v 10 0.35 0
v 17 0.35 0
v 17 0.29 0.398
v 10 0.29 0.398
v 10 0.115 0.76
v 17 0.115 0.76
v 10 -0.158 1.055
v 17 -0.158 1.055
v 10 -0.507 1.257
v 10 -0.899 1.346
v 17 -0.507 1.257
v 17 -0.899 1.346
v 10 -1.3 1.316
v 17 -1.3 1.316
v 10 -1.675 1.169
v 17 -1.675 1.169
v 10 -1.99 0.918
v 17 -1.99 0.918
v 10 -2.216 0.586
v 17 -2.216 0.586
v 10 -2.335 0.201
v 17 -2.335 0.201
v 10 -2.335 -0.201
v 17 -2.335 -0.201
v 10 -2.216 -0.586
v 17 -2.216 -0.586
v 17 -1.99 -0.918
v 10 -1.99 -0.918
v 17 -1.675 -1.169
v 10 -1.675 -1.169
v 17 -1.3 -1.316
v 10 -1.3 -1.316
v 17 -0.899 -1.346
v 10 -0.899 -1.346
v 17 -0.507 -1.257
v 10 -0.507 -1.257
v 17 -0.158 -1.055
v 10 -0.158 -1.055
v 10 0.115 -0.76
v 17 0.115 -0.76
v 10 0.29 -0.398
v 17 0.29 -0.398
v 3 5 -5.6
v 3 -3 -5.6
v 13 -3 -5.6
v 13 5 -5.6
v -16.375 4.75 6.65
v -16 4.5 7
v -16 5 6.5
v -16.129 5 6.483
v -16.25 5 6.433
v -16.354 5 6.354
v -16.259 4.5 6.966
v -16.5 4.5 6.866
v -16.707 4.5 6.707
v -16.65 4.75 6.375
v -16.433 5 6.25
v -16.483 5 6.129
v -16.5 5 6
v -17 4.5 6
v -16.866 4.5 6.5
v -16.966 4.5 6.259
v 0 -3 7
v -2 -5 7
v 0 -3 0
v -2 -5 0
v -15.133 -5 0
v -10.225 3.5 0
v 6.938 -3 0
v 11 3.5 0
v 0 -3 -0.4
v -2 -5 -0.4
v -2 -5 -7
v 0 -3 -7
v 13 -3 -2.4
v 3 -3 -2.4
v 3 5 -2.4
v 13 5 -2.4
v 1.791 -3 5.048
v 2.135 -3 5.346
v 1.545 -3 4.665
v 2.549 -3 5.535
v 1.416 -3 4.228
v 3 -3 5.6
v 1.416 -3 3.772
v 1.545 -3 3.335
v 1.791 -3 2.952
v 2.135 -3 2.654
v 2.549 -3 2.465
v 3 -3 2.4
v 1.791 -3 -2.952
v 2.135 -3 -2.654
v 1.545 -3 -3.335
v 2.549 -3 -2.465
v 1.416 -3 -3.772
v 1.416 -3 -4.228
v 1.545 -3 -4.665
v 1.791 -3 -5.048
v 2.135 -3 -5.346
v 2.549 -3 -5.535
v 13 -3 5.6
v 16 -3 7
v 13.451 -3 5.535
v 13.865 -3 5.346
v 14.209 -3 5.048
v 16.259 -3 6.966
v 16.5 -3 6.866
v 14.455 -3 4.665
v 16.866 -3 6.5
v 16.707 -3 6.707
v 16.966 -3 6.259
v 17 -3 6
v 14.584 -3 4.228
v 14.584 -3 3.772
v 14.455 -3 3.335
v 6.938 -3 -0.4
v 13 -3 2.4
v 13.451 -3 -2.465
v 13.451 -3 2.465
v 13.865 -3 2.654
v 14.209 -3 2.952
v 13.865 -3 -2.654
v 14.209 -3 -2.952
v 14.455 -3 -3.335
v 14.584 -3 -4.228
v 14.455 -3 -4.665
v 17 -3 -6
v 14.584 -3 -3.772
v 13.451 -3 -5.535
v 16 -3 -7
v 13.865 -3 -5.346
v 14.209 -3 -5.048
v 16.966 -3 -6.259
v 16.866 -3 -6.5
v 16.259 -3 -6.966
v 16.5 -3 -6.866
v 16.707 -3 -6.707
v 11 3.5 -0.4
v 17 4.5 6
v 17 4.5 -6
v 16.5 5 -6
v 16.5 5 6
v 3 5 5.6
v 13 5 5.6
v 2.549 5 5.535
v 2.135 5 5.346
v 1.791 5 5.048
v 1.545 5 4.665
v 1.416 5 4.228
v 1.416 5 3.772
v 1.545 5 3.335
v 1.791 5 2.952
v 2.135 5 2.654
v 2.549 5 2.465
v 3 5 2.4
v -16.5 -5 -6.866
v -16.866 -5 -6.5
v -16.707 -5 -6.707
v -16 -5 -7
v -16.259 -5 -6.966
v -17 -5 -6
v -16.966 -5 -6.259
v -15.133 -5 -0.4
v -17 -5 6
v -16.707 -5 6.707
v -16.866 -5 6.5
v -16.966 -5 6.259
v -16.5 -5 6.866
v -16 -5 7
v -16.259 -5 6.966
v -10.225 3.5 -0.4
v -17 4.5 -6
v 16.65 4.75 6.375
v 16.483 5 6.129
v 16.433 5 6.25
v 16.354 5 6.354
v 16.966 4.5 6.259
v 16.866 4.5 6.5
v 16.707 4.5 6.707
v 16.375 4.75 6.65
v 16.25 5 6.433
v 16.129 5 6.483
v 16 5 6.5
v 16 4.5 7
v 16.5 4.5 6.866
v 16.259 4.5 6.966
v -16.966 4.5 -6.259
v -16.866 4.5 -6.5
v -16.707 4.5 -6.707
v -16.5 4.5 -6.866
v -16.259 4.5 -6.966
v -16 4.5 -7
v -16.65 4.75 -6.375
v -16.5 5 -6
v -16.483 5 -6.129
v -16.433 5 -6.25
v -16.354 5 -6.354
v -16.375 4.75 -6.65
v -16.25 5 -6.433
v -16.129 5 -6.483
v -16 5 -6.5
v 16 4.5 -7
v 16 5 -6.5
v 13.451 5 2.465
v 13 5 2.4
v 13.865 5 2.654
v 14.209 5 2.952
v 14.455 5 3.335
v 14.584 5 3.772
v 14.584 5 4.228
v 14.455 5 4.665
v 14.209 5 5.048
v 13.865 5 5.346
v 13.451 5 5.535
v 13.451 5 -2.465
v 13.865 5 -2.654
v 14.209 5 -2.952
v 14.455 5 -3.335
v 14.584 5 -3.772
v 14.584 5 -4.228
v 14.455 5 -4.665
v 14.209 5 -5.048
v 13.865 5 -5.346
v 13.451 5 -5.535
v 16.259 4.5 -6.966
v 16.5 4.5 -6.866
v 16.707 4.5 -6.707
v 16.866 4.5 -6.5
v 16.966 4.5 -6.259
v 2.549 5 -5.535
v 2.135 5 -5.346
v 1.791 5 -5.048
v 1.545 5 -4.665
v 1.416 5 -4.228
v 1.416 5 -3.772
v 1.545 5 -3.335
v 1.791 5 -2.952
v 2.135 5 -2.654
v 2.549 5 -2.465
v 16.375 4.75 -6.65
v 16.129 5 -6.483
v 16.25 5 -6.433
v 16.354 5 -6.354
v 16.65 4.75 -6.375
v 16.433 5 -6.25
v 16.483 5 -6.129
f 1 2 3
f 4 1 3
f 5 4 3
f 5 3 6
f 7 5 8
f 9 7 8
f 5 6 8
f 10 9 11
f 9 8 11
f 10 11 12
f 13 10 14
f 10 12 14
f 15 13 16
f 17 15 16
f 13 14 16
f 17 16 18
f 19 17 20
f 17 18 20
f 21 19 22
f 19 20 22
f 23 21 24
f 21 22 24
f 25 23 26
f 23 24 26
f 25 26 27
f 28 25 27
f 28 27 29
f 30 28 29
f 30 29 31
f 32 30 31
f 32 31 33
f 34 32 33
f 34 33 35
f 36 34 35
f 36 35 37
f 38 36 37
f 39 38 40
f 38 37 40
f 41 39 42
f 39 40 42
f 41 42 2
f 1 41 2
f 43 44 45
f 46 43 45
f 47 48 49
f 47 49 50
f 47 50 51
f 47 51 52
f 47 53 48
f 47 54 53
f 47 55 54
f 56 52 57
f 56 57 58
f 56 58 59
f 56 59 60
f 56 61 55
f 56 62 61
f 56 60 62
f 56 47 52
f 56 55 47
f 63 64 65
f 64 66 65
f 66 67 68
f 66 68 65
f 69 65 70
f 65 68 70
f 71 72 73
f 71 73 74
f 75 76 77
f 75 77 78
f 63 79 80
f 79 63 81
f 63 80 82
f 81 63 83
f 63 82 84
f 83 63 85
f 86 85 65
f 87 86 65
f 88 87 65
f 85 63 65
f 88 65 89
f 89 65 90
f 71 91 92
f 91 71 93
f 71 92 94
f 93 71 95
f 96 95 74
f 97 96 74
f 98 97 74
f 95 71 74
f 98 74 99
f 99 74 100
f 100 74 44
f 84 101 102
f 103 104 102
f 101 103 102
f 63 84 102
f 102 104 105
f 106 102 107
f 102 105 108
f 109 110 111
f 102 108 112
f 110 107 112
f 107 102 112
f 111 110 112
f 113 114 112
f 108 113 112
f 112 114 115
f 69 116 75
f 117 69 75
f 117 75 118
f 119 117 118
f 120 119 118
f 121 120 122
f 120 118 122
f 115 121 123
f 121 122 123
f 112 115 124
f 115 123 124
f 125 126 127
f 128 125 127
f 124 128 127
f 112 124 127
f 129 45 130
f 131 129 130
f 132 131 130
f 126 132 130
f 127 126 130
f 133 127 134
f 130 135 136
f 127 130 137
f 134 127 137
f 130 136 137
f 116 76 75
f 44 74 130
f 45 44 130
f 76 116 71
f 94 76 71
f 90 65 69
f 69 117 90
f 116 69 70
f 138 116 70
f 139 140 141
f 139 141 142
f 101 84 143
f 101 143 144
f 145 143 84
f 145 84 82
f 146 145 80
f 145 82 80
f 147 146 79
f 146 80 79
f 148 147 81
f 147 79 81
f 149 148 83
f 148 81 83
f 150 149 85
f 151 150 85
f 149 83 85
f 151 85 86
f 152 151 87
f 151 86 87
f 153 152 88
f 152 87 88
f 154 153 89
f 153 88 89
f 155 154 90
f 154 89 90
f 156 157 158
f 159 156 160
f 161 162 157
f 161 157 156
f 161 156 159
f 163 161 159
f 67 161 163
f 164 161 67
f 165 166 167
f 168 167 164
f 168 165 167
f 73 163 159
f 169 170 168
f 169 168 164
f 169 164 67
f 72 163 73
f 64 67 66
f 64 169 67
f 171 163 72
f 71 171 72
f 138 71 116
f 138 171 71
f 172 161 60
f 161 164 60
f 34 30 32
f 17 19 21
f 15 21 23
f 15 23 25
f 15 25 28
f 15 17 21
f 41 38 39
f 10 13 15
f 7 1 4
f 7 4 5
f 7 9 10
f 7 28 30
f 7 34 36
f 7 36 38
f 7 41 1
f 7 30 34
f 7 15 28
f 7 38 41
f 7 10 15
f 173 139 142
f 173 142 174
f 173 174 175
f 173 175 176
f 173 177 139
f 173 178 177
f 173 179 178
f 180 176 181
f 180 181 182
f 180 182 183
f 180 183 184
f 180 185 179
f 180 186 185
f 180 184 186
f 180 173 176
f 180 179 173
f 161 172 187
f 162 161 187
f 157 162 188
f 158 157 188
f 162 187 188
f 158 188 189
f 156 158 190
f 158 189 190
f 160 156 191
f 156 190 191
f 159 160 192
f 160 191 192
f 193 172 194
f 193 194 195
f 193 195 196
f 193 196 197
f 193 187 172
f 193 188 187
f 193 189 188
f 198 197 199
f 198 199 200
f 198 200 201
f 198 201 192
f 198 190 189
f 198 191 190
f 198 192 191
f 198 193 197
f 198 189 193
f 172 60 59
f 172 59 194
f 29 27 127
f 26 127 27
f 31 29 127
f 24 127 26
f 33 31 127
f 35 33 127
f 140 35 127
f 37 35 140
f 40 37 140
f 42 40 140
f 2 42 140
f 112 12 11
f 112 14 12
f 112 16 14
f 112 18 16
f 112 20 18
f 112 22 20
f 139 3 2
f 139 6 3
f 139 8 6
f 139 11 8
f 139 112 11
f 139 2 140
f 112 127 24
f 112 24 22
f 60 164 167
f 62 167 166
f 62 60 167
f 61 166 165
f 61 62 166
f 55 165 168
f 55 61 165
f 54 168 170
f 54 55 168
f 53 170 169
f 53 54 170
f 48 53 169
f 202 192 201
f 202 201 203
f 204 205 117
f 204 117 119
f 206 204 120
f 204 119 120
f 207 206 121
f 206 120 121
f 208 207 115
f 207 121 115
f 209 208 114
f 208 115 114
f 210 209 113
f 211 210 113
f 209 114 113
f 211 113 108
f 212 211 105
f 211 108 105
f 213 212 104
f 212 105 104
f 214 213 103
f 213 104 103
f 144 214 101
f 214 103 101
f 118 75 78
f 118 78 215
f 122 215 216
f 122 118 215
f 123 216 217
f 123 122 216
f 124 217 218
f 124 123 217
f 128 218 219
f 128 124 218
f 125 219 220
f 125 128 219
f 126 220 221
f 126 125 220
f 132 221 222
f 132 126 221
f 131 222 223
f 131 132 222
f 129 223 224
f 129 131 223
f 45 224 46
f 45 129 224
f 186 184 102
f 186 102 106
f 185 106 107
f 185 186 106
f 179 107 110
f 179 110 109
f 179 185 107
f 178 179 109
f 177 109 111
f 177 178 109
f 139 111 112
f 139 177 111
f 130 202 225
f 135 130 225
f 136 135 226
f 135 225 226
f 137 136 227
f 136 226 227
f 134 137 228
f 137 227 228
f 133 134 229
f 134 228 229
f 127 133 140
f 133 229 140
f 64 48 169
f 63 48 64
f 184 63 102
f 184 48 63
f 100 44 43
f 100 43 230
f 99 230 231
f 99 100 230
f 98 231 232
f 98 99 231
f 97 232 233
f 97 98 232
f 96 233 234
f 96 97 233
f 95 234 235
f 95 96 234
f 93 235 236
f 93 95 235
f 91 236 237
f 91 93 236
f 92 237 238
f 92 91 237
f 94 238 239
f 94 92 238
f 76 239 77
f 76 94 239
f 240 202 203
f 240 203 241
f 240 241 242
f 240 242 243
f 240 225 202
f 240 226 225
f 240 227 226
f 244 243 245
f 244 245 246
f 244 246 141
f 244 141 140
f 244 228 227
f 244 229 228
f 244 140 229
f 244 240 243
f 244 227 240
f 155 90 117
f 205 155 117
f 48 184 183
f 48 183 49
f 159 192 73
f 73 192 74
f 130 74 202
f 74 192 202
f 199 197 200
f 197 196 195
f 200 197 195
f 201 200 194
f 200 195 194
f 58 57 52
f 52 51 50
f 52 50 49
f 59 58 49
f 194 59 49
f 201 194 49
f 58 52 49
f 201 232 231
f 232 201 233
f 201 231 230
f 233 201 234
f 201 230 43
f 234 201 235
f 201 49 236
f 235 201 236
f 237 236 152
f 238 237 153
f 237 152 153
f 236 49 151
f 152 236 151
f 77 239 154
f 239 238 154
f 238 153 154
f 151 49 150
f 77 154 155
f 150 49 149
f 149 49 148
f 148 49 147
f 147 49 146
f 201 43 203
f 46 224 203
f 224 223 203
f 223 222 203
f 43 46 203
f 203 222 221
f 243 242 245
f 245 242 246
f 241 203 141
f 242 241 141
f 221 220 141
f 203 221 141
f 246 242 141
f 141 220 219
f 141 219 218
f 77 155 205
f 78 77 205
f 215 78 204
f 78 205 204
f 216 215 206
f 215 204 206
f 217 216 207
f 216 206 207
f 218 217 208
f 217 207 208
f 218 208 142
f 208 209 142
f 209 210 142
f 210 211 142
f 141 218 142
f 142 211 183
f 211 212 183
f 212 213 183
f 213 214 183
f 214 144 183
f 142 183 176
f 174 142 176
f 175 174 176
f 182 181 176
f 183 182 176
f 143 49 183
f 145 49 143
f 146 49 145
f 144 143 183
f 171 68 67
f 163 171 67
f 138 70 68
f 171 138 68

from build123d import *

# Parameters (mm, degrees)
SKETCH_W        = 34
SKETCH_H        = 10
PAD_DEPTH       = 7
POCKET_DEPTH    = 0.4
FILLET_R        = 1
POCKET001_DEPTH = 86.211236
CHAMFER_SIZE    = 0.5
SKETCH005_R     = 1.35
POCKET002_DEPTH = 7
POCKET003_DEPTH = 14.001


with BuildPart() as part:
    # Sketch (on XY_Plane of Origin) → Pad (new body, symmetric)
    with BuildSketch(Plane.XY):
        Rectangle(SKETCH_W, SKETCH_H)
    extrude(amount=PAD_DEPTH, both=True)

    # Sketch002 (on XY_Plane of Origin) → Pocket (cut)
    with BuildSketch(Plane.XY):
        Polygon((4.751306, -6.5), (11, 3.5), (-10.225191, 3.5), (-15.998694, -6.5), align=None)
    extrude(amount=-POCKET_DEPTH, mode=Mode.SUBTRACT)

    # Fillet
    fillet_edges = [part.edges().sort_by_distance(p)[0] for p in [
        (17, 0, 7),
        (17, 0, -7),
        (-17, 0, -7),
        (-17, 0, 7),
    ]]
    fillet(fillet_edges, radius=FILLET_R)

    # Sketch003 (on Face1 of Fillet) → Pocket001 (cut, through all)
    with BuildSketch(Plane.XZ.offset(5)):
        with BuildLine():
            ThreePointArc((3, 5.6), (1.4, 4), (3, 2.4))
            Line((3, 2.4), (13, 2.4))
            ThreePointArc((13, 2.4), (14.6, 4), (13, 5.6))
            Line((3, 5.6), (13, 5.6))
        make_face()
    pocket001 = extrude(amount=-POCKET001_DEPTH, mode=Mode.SUBTRACT)

    # Mirrored: Pocket001 across XY
    add(pocket001.mirror(Plane.XY), mode=Mode.SUBTRACT)

    # Chamfer
    chamfer_edges = [part.edges().sort_by_distance(p)[0] for p in [
        (0, 5, -7),
    ]]
    chamfer(chamfer_edges, length=CHAMFER_SIZE)

    # Sketch005 (on Face13 of Chamfer) → Pocket002 (cut)
    with BuildSketch(Plane.YZ.offset(17)):
        with Locations((-1, 0)):
            Circle(SKETCH005_R)
    extrude(amount=-POCKET002_DEPTH, mode=Mode.SUBTRACT)

    # Sketch006 (on Face7 of Pocket002) → Pocket003 (cut, through all)
    with BuildSketch(Plane(origin=(0, 0, -7), x_dir=(1, 0, 0), z_dir=(0, 0, -1))):
        Polygon((-4, 7), (0, 3), (22.51627, 3), (22.51627, 7), align=None)
    extrude(amount=-POCKET003_DEPTH, mode=Mode.SUBTRACT)


solid = part.part
